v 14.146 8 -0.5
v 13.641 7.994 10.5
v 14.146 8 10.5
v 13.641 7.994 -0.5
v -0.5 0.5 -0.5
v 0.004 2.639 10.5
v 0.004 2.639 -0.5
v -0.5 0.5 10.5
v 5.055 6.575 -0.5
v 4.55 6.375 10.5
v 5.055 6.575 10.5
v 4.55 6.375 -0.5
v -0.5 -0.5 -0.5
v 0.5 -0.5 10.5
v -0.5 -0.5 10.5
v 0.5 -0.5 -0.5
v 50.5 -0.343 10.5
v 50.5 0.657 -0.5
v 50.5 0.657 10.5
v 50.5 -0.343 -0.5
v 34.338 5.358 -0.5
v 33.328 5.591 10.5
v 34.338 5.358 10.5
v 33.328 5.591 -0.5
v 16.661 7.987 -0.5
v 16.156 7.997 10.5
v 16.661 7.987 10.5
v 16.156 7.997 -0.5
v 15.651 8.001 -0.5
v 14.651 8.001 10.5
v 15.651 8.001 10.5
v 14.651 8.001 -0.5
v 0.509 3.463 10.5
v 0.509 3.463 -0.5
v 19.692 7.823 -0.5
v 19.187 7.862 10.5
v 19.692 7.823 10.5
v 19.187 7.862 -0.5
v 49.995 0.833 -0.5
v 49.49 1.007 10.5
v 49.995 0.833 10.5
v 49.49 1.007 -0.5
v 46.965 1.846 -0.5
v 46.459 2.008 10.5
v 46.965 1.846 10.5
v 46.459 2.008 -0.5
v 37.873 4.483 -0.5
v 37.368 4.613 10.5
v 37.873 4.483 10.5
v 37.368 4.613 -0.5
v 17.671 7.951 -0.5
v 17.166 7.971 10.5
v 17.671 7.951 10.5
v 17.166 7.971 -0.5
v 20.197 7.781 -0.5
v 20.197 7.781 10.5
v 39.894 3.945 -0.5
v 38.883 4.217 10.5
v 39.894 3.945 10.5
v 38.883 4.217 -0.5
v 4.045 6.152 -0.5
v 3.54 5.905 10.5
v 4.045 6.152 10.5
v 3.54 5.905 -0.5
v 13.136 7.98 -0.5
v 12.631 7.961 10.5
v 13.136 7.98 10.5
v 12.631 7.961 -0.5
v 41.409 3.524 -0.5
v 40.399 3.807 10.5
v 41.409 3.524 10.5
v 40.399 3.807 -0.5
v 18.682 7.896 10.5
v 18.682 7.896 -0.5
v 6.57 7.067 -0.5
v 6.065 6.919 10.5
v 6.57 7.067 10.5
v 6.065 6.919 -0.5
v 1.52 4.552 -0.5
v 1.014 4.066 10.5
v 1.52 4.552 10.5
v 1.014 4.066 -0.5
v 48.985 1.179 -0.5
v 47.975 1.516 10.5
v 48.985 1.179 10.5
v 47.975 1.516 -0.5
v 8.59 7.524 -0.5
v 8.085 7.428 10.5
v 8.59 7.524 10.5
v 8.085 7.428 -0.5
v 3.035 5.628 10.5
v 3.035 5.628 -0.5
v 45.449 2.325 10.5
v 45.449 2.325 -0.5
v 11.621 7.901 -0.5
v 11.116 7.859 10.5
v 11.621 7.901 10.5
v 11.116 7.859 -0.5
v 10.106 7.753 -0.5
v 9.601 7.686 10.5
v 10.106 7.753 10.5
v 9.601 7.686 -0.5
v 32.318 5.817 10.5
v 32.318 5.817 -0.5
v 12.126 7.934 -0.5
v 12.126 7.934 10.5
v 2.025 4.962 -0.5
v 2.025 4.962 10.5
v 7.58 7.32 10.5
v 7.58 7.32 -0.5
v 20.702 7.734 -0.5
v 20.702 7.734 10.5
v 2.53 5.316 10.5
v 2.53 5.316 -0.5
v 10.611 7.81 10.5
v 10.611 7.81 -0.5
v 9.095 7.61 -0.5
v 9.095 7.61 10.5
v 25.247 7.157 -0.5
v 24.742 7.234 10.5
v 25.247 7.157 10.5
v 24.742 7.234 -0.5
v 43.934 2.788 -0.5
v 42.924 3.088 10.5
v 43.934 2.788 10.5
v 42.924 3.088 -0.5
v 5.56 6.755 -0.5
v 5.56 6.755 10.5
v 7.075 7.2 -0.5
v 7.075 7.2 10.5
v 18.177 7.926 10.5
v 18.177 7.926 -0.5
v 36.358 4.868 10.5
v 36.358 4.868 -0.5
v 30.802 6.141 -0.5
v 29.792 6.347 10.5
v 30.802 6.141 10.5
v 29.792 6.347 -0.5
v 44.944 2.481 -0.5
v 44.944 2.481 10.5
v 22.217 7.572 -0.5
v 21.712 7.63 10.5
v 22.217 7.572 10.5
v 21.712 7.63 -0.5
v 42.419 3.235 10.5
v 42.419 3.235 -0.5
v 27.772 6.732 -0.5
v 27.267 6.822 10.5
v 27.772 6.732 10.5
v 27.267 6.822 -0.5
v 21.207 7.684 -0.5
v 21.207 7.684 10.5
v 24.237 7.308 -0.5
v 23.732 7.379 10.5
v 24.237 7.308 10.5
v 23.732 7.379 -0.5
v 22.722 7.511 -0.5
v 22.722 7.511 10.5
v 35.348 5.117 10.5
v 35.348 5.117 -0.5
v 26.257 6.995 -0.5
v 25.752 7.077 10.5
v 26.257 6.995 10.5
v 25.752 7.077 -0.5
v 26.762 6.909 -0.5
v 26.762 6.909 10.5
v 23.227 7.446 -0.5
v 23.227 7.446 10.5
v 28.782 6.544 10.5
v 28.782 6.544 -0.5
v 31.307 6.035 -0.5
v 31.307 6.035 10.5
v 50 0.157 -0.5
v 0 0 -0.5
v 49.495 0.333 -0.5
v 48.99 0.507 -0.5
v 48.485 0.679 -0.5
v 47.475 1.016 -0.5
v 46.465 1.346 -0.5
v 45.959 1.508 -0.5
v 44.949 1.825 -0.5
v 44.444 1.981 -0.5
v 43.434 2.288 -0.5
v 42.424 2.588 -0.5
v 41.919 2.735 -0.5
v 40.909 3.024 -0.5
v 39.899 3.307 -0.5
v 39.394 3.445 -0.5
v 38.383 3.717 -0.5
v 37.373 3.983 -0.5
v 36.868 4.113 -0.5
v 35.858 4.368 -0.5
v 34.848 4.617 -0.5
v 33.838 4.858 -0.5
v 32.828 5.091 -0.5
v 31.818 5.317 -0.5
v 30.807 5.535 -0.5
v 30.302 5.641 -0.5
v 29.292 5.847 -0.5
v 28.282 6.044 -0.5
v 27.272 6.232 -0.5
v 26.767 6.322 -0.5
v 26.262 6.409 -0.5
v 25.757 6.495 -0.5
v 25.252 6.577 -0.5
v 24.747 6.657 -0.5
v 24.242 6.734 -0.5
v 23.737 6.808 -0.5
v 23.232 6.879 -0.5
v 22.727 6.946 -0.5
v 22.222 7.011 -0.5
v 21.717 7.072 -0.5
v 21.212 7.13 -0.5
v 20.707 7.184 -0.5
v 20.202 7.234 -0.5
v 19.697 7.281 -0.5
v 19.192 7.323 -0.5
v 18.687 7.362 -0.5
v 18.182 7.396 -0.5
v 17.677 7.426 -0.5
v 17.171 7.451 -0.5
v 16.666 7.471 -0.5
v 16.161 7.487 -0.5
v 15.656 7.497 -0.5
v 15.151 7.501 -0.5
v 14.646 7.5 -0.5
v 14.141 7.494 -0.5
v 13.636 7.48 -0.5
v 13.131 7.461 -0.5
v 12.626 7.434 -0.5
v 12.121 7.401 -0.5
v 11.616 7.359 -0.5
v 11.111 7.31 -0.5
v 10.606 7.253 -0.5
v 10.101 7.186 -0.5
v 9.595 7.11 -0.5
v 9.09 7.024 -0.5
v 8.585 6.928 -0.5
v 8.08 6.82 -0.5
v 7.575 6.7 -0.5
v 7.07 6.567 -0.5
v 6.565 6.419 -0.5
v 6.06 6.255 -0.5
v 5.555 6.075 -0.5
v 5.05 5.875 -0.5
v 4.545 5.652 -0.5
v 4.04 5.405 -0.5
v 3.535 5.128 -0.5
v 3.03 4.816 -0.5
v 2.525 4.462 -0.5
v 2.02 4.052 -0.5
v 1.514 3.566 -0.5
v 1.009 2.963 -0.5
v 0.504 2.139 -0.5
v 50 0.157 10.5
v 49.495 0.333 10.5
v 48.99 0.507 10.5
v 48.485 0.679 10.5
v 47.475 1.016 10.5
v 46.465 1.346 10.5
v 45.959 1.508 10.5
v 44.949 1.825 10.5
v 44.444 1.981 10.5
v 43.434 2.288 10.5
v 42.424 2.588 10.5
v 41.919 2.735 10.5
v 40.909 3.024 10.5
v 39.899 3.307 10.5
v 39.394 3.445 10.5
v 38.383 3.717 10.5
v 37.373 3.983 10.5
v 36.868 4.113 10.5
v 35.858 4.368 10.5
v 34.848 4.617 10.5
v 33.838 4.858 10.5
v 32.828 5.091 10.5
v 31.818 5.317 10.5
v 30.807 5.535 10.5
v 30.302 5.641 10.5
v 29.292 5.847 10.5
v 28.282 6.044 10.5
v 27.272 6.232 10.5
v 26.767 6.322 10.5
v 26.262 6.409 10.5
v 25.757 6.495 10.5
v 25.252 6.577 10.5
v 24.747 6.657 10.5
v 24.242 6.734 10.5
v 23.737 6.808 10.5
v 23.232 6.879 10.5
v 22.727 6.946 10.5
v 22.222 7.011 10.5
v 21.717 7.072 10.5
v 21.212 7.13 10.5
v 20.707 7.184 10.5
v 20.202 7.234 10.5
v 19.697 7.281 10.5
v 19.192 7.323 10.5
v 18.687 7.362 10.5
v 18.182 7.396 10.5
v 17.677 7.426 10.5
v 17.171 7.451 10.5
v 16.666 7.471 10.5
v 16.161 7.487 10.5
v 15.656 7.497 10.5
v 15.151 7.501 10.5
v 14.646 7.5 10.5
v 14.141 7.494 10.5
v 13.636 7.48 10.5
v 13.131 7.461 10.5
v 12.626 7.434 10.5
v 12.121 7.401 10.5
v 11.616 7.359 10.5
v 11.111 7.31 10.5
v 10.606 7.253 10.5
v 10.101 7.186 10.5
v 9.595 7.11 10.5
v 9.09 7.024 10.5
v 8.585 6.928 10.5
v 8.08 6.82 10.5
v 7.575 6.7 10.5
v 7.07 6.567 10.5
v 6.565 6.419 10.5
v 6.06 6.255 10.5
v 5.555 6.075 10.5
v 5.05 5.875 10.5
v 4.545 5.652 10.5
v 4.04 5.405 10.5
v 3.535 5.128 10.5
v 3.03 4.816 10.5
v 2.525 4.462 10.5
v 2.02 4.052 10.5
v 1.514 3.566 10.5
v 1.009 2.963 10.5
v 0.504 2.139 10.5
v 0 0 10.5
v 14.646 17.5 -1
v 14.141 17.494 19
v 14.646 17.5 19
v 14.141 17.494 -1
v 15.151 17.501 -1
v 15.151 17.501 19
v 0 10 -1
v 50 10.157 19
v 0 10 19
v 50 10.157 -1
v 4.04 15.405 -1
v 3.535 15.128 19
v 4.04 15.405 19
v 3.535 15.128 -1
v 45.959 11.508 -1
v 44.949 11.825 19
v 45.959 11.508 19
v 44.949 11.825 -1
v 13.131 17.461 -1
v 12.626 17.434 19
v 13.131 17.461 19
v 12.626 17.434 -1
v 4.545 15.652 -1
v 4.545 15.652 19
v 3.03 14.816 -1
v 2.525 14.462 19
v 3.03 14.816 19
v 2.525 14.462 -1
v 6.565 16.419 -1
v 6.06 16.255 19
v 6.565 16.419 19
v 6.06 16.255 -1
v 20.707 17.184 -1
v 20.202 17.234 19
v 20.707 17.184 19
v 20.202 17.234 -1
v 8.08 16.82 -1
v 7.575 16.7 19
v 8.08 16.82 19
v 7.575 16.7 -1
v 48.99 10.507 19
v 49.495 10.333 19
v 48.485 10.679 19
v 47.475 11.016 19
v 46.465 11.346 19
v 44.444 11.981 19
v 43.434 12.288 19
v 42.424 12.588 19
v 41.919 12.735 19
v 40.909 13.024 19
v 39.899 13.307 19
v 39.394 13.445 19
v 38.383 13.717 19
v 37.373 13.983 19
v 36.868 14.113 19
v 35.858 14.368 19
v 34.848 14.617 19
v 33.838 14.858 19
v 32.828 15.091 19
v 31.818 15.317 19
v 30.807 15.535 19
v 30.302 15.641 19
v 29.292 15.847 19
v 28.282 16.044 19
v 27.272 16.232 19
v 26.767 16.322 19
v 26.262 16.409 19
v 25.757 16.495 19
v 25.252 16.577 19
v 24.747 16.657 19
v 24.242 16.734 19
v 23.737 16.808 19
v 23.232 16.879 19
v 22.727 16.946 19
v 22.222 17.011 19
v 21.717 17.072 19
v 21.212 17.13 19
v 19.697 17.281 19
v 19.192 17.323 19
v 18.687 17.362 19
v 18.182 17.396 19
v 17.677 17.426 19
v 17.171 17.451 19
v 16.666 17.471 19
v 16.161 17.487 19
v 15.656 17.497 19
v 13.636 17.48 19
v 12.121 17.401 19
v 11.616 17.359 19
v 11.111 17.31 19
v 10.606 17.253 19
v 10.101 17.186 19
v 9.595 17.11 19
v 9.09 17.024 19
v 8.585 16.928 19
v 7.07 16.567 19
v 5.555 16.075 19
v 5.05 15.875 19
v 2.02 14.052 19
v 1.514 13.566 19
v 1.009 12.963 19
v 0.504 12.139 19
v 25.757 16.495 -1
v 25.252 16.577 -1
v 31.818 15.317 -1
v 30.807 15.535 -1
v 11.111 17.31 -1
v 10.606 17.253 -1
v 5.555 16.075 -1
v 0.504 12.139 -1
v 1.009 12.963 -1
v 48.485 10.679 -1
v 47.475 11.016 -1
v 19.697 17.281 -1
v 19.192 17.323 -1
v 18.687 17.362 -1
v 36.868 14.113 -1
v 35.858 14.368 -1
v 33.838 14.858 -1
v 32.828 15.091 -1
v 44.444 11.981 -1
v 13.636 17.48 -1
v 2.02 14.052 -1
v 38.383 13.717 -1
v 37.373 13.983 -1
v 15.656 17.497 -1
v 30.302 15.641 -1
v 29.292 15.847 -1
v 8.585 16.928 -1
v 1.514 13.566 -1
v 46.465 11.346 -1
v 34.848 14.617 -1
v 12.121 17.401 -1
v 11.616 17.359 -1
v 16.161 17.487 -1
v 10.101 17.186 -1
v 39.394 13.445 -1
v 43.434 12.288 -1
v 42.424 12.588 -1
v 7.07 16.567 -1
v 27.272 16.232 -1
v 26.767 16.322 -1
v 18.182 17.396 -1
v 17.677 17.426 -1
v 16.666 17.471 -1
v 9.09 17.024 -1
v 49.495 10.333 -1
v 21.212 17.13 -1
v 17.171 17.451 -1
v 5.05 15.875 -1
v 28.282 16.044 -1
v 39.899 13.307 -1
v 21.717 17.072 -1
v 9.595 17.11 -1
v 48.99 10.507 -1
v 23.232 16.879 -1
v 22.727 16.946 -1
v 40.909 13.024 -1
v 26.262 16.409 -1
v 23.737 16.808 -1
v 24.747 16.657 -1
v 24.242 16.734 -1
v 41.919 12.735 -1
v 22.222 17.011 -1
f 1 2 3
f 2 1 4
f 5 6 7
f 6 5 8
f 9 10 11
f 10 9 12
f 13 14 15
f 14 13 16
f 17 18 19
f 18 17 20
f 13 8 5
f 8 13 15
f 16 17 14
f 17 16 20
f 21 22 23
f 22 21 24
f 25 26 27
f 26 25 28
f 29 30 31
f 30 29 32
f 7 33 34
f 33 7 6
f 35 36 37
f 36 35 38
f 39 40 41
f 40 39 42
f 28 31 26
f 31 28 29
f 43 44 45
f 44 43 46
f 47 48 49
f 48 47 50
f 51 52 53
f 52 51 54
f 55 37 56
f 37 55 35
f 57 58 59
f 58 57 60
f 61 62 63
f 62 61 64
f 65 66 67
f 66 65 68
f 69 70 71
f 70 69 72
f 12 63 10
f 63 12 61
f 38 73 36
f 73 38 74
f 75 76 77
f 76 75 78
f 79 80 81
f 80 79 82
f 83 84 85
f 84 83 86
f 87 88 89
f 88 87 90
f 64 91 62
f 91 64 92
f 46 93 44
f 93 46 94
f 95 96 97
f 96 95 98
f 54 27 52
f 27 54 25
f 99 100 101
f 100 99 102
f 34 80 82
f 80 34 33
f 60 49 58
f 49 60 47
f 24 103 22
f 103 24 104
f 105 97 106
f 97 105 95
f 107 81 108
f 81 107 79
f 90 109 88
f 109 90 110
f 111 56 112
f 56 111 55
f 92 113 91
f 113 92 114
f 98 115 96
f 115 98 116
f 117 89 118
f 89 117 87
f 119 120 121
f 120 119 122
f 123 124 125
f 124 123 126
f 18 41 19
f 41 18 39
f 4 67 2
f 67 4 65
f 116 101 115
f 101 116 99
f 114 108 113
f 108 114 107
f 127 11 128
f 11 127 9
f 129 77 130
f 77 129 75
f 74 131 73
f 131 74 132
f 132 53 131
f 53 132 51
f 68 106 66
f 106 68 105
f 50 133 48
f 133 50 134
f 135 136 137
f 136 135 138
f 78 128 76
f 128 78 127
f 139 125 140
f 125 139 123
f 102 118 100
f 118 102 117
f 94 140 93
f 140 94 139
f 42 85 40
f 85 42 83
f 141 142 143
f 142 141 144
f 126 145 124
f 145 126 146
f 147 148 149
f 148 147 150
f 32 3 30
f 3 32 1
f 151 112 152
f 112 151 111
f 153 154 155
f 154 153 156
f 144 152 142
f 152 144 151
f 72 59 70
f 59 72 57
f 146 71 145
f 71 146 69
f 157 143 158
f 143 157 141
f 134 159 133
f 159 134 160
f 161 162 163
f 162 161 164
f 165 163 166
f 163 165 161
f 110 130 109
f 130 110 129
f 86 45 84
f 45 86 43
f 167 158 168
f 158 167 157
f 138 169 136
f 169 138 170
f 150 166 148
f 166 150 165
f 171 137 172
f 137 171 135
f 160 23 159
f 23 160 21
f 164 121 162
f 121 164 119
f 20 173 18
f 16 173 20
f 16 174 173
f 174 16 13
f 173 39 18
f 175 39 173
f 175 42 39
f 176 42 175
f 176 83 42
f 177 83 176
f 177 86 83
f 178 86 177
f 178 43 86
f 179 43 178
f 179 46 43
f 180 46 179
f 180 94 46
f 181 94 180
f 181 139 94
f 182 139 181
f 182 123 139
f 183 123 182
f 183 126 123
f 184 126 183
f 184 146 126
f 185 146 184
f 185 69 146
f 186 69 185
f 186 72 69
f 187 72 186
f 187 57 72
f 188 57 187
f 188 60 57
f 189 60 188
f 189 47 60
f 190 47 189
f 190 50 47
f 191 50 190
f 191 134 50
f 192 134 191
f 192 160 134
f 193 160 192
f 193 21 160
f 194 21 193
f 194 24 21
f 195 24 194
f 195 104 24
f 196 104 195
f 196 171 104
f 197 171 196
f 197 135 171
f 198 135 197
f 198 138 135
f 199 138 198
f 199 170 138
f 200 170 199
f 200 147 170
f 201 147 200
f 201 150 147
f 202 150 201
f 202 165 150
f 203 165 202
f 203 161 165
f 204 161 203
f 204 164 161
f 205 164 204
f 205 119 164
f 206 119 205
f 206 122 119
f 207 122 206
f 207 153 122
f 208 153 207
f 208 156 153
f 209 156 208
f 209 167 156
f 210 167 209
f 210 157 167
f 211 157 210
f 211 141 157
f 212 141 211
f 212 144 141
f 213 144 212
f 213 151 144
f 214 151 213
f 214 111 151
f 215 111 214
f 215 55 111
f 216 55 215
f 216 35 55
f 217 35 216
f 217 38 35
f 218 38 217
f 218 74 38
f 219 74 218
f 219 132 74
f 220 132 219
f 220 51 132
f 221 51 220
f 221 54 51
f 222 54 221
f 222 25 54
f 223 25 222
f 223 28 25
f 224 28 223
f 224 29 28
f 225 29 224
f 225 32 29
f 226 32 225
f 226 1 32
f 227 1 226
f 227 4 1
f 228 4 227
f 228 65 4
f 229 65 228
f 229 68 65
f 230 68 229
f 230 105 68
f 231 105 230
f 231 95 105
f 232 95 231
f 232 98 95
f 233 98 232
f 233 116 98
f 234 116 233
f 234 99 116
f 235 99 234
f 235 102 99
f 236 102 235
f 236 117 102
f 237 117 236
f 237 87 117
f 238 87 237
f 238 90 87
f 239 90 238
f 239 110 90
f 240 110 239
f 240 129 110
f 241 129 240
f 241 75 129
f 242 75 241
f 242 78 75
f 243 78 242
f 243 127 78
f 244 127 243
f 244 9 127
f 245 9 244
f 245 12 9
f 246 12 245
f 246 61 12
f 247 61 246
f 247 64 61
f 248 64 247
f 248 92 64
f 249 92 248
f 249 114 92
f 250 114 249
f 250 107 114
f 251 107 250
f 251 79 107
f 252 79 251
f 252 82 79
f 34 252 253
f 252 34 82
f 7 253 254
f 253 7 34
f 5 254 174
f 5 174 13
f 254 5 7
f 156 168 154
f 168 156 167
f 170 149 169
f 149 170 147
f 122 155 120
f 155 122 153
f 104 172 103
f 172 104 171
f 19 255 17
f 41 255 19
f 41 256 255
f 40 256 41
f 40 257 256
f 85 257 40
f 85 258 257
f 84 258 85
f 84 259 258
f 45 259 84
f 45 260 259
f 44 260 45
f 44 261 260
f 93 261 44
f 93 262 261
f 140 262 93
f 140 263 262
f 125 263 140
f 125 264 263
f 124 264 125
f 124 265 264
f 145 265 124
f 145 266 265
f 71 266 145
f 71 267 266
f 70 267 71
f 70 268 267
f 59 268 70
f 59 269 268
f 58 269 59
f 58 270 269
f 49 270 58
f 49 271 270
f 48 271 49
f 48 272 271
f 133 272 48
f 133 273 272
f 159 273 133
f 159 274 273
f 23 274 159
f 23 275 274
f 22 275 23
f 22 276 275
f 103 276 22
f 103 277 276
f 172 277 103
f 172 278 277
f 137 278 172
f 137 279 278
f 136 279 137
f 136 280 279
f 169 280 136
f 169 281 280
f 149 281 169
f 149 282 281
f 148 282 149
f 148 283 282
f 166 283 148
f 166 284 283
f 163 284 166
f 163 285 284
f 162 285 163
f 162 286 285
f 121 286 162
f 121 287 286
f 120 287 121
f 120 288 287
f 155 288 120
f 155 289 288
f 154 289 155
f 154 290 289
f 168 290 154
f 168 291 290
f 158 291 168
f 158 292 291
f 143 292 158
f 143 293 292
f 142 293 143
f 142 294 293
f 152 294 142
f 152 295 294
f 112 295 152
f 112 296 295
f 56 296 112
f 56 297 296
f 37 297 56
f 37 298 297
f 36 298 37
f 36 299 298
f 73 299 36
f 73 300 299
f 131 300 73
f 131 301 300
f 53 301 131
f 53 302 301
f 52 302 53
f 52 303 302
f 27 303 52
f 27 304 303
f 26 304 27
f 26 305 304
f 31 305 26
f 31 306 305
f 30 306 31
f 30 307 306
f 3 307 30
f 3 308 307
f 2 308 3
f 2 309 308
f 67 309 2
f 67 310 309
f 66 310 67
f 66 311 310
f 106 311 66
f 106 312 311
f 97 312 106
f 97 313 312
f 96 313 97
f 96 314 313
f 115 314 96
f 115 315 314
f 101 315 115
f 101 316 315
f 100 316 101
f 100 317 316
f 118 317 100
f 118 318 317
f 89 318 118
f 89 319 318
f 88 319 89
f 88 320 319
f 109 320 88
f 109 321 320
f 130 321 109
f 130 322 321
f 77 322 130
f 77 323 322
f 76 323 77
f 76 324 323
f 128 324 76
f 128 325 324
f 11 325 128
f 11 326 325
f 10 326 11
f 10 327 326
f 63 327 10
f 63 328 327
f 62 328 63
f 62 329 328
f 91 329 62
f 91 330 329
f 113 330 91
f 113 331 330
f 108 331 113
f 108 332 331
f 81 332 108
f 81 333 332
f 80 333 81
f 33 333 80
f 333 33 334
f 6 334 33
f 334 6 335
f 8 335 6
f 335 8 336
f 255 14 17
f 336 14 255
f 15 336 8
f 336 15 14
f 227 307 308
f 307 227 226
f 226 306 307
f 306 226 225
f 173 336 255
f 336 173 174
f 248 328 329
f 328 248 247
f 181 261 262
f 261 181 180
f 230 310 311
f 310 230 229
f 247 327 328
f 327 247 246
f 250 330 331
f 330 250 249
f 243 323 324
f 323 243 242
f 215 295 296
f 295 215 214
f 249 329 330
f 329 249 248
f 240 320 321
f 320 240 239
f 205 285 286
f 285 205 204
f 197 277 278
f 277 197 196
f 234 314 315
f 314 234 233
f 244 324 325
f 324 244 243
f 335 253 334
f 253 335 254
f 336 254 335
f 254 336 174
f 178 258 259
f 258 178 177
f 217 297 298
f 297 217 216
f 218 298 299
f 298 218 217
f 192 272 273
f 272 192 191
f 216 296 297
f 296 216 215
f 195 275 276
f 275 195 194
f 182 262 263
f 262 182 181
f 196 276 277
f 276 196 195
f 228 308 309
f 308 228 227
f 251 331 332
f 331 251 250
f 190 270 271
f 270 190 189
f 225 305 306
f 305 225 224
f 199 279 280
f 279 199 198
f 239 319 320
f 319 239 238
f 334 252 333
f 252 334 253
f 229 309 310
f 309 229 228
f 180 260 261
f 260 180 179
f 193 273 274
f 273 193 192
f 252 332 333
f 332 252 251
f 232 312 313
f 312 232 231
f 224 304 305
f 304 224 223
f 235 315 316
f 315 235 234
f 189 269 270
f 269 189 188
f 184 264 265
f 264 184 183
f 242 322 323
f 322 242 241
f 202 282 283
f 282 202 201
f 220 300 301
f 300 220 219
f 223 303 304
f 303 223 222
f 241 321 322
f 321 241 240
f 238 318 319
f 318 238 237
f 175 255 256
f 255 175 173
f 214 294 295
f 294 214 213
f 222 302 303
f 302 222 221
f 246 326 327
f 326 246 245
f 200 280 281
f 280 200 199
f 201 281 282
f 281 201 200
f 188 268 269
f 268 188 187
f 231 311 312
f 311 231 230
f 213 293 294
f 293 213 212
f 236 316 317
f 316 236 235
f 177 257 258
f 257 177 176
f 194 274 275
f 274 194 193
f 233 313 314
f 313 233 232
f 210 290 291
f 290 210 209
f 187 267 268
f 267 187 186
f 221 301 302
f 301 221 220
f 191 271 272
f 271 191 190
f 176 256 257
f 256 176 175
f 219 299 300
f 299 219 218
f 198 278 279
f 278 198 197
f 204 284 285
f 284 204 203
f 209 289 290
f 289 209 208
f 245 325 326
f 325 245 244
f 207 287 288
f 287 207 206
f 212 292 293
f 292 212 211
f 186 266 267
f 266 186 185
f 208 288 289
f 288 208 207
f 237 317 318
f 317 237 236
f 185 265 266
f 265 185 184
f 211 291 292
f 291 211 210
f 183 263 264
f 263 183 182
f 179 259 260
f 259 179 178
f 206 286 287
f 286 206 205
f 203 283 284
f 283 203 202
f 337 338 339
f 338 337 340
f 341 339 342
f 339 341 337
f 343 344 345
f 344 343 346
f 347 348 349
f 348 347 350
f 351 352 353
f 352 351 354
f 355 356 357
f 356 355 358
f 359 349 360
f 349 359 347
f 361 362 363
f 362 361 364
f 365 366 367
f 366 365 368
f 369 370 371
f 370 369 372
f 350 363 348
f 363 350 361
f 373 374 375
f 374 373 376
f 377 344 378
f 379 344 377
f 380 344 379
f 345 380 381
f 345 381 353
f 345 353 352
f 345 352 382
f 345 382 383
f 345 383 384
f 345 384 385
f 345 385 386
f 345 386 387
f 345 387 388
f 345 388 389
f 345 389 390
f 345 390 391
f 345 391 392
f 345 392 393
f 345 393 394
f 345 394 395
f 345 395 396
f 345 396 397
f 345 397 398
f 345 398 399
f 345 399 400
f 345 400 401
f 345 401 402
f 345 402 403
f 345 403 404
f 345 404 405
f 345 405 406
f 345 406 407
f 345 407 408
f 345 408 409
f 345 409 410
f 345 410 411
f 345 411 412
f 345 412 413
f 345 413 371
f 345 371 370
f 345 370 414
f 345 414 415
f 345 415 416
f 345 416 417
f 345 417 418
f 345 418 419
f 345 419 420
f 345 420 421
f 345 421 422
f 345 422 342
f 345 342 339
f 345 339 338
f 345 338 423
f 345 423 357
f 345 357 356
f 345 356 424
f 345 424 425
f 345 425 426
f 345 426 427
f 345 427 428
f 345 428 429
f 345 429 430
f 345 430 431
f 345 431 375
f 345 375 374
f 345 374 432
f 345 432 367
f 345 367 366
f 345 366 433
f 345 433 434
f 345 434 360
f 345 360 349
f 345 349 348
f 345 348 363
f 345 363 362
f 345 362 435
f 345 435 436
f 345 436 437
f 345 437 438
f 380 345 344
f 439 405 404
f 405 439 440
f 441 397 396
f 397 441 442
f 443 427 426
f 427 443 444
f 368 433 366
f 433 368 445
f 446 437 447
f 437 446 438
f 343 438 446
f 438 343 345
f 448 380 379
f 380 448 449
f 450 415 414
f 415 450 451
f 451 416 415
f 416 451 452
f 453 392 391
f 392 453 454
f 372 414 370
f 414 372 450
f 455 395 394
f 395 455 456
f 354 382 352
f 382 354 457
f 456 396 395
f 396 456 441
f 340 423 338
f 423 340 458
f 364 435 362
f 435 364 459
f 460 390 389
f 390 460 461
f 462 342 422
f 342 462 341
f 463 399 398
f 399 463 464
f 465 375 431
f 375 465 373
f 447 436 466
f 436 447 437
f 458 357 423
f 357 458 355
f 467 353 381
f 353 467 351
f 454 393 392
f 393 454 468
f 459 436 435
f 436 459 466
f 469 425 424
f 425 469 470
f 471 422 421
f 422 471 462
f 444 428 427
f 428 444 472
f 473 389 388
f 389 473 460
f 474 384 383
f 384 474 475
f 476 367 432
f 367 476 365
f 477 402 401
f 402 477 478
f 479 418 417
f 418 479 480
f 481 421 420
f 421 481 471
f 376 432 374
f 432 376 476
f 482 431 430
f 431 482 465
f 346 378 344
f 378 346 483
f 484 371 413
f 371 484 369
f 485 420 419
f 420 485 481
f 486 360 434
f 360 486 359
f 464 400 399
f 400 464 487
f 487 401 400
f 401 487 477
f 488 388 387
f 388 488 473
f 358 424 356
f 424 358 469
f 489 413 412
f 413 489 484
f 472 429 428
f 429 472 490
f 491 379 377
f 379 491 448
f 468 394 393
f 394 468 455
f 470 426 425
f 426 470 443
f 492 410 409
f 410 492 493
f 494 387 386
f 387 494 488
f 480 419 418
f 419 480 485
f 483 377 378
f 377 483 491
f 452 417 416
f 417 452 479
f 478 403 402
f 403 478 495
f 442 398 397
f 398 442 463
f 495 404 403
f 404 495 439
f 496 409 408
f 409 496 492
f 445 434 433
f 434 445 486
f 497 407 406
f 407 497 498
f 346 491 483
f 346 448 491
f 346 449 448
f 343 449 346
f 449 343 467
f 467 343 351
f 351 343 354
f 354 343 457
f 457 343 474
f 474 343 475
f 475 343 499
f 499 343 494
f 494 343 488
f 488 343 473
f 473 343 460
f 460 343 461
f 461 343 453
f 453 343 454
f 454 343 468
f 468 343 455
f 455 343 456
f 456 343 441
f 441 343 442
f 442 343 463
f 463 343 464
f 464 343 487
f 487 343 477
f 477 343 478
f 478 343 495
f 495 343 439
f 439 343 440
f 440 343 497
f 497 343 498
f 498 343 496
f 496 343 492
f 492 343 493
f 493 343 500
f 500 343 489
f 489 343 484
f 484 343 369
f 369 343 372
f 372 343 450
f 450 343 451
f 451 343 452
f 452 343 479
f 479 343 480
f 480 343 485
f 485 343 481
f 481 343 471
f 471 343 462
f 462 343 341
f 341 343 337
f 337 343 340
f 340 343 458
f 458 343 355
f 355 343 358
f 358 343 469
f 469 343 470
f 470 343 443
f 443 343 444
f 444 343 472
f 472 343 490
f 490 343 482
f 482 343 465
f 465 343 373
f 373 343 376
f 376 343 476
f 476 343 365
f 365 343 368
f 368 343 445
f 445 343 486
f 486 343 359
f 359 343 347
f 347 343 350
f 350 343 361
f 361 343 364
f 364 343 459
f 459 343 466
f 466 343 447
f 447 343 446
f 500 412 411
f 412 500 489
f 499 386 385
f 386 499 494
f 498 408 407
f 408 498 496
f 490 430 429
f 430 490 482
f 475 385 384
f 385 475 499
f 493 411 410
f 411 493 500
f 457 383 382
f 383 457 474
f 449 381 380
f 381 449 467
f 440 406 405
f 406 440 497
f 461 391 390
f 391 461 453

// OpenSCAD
// file: submodules/openscad_airfoils/naca.scad
// From https://github.com/openscad/documentation/blob/master/OpenSCAD_Tutorial/Tutorial_Files/chapter_9/naca.scad
function naca_half_thickness(x,t) = 5*t*(0.2969*sqrt(x) - 0.1260*x - 0.3516*pow(x,2) + 0.2843*pow(x,3) - 0.1015*pow(x,4));
function naca_top_coordinates(t,n) = [ for (x=[0:1/(n-1):1]) [x, naca_half_thickness(x,t)]];
function naca_bottom_coordinates(t,n) = [ for (x=[1:-1/(n-1):0]) [x, - naca_half_thickness(x,t)]];
function naca_coordinates(t,n) = concat(naca_top_coordinates(t,n), naca_bottom_coordinates(t,n));
module naca_airfoil(chord,t,n) {
    points = naca_coordinates(t,n);
    scale([chord,chord,1])
        polygon(points);
}
module naca_wing(span,chord,t,n,center=false) {
    linear_extrude(height=span,center=center) {
        naca_airfoil(chord,t,n);
    }
}

naca_bottom_coordinates(t=0.12, n=300);

//naca_airfoil(chord=10, t=0.12, n=300);
// main file
//shape = polygon(
//  points=[
//    [0,0],[2,1],[1,2],[1,3],[3,4],[0,5]] );
//
//rotate([90, 0, 0])
//  shape();

module mirror_copy(v = [1, 0, 0]) {
  //children();
  mirror(v)
    children();
}

//linear_extrude(height = 10, convexity = 10, twist = 0)

module myObject() {
  polygon(
    points=[
      [0,0],[2,1],[1,2],[1,3],[3,4],[0,5]]
    );
}

//mirror([1, 0, 0])

//mirror_copy(v=[1, 0, 0]) {
//mirror(v=[1, 0, 0]) {
//    myObject();
//}

//myObject();
//mirror(v=[1, 0, 0])
 //   myObject();

//linear_extrude(height = 10, center = true, convexity = 10, twist = 0)
//translate([2, 0, 0])
//circle(r = 1);

// Points from 2032c.dat in the archive: http://m-selig.ae.illinois.edu/ads/archives/coord_seligFmt.tar.gz
// Not necessarily in the same order as in: http://m-selig.ae.illinois.edu/ads/coord/2032c.dat

use <submodules/openscad_airfoils/naca.scad>


module naca_top_airfoil(chord,t,n) {
    points = naca_top_coordinates(t,n);
    //inner_points = [ for (0:n-1] [points
    //echo(points);
    //echo("points[0]=", points[0], "points[0][1]=", points[0][1], "points[1]=", points[1], "points[1][0]", points[1][0], "points[1][1]", points[1][1]);
    scale([chord,chord,0])
        polygon(points);
}

chord=50;
module x(c=chord) {
  linear_extrude(height=10)
      naca_top_airfoil(c, 0.30, 100);
}
//x();

module offset_shell(t = 0.1, unit=1) {
  t2x = t * 2;
  difference() {
    // The "shell" what's left after stamping with the "die"
    render() { // Expensive operation, render to a mesh
      minkowski() {
        children();
        cube([t2x, t2x, t2x], center=true);
      }
    }
    // The "die" portion that is substracted away
    // (i.e. the original item that is the "hole in the
    //  minkowski of the child to create the shell)
    translate([0, 0, -t2x]) scale([1, 1, 1+t2x])
      children();
  }
}

thickness=0.5;
t2x=thickness * 2;
offset_shell(t=thickness)
  x();

// The "die" so it can be visually compared with the offset_shell of x
translate([0, 10, 0]) {
  translate([0, 0, -t2x]) scale([1, 1, 1 + t2x]) {
    x();
  }
}

//naca_top_airfoil(50, 0.30, 100);

module naca_outline_airfoil(chord, t, n, percent) {
    outer = naca_top_coordinates(t,n);
    offset = (1 - percent) / 2;
    inner = [ for (x = [0:n-2]) [ (outer[x][0] * percent) + offset, outer[x][1] * percent ] ];
    //echo("outer: ", outer);
    //echo("inner: ", inner);
    all = concat(outer, [for (x = [n-2:-1:0]) [inner[x][0], inner[x][1]]]); 
    //echo("all:   ", all);
    scale([chord,chord,0])
      polygon(points=all);
}

//translate([2, 2, 0])
//  naca_outline_airfoil(10, 0.30, 100, 0.90);

module top(chord, thickness, fineness=20) {
  translate([0, 0, 00])
  rotate([-90, 0, -90])
  rotate_extrude(angle=180, convexity=2, $fn=fineness)
  {
    rotate([0, 0, 90])
    naca_outline_airfoil(chord=chord, t=thickness, n=fineness, percent=0.90);
    //naca_top_airfoil(chord=chord, t=thickness, n=fineness);
    //naca_airfoil(chord=chord, t=thickness, n=fineness);
  }
}

//top(chord=100, thickness=0.30, fineness=200);

//$fa = 1;
//$fs = 0.4;
//wheel_radius = 12;
//tyre_diameter = 6;
//rotate_extrude(angle=360) {
//translate([wheel_radius - tyre_diameter/2, 0, 0])
//  circle(d=tyre_diameter);
//}

//2032c_points = [[1000,1.6],[950,12.4],[900,22.9],[800,42.8],[700,61],[600,77.1],[500,90.5],[400,100.2],[300,104.8],[250,104.4],[200,101.3],[150,93.4],[100,78],[75,66.4],[50,51.3],[25,31.7],[12.5,19.3],[0,0],[12.5,-5],[25,-4.2],[50,-1],[75,2.8],[100,6.8],[150,14.5],[200,21.7],[250,28.2],[300,33.3],[400,38.5],[500,38.6],[600,35],[700,28.6],[800,20.2],[900,10],[950,4.4]];
//
//linear_extrude(height=20)
//scale([15, 15])
//translate([0,0])
//scale (0.001)
//polygon(points=2032c_points);
